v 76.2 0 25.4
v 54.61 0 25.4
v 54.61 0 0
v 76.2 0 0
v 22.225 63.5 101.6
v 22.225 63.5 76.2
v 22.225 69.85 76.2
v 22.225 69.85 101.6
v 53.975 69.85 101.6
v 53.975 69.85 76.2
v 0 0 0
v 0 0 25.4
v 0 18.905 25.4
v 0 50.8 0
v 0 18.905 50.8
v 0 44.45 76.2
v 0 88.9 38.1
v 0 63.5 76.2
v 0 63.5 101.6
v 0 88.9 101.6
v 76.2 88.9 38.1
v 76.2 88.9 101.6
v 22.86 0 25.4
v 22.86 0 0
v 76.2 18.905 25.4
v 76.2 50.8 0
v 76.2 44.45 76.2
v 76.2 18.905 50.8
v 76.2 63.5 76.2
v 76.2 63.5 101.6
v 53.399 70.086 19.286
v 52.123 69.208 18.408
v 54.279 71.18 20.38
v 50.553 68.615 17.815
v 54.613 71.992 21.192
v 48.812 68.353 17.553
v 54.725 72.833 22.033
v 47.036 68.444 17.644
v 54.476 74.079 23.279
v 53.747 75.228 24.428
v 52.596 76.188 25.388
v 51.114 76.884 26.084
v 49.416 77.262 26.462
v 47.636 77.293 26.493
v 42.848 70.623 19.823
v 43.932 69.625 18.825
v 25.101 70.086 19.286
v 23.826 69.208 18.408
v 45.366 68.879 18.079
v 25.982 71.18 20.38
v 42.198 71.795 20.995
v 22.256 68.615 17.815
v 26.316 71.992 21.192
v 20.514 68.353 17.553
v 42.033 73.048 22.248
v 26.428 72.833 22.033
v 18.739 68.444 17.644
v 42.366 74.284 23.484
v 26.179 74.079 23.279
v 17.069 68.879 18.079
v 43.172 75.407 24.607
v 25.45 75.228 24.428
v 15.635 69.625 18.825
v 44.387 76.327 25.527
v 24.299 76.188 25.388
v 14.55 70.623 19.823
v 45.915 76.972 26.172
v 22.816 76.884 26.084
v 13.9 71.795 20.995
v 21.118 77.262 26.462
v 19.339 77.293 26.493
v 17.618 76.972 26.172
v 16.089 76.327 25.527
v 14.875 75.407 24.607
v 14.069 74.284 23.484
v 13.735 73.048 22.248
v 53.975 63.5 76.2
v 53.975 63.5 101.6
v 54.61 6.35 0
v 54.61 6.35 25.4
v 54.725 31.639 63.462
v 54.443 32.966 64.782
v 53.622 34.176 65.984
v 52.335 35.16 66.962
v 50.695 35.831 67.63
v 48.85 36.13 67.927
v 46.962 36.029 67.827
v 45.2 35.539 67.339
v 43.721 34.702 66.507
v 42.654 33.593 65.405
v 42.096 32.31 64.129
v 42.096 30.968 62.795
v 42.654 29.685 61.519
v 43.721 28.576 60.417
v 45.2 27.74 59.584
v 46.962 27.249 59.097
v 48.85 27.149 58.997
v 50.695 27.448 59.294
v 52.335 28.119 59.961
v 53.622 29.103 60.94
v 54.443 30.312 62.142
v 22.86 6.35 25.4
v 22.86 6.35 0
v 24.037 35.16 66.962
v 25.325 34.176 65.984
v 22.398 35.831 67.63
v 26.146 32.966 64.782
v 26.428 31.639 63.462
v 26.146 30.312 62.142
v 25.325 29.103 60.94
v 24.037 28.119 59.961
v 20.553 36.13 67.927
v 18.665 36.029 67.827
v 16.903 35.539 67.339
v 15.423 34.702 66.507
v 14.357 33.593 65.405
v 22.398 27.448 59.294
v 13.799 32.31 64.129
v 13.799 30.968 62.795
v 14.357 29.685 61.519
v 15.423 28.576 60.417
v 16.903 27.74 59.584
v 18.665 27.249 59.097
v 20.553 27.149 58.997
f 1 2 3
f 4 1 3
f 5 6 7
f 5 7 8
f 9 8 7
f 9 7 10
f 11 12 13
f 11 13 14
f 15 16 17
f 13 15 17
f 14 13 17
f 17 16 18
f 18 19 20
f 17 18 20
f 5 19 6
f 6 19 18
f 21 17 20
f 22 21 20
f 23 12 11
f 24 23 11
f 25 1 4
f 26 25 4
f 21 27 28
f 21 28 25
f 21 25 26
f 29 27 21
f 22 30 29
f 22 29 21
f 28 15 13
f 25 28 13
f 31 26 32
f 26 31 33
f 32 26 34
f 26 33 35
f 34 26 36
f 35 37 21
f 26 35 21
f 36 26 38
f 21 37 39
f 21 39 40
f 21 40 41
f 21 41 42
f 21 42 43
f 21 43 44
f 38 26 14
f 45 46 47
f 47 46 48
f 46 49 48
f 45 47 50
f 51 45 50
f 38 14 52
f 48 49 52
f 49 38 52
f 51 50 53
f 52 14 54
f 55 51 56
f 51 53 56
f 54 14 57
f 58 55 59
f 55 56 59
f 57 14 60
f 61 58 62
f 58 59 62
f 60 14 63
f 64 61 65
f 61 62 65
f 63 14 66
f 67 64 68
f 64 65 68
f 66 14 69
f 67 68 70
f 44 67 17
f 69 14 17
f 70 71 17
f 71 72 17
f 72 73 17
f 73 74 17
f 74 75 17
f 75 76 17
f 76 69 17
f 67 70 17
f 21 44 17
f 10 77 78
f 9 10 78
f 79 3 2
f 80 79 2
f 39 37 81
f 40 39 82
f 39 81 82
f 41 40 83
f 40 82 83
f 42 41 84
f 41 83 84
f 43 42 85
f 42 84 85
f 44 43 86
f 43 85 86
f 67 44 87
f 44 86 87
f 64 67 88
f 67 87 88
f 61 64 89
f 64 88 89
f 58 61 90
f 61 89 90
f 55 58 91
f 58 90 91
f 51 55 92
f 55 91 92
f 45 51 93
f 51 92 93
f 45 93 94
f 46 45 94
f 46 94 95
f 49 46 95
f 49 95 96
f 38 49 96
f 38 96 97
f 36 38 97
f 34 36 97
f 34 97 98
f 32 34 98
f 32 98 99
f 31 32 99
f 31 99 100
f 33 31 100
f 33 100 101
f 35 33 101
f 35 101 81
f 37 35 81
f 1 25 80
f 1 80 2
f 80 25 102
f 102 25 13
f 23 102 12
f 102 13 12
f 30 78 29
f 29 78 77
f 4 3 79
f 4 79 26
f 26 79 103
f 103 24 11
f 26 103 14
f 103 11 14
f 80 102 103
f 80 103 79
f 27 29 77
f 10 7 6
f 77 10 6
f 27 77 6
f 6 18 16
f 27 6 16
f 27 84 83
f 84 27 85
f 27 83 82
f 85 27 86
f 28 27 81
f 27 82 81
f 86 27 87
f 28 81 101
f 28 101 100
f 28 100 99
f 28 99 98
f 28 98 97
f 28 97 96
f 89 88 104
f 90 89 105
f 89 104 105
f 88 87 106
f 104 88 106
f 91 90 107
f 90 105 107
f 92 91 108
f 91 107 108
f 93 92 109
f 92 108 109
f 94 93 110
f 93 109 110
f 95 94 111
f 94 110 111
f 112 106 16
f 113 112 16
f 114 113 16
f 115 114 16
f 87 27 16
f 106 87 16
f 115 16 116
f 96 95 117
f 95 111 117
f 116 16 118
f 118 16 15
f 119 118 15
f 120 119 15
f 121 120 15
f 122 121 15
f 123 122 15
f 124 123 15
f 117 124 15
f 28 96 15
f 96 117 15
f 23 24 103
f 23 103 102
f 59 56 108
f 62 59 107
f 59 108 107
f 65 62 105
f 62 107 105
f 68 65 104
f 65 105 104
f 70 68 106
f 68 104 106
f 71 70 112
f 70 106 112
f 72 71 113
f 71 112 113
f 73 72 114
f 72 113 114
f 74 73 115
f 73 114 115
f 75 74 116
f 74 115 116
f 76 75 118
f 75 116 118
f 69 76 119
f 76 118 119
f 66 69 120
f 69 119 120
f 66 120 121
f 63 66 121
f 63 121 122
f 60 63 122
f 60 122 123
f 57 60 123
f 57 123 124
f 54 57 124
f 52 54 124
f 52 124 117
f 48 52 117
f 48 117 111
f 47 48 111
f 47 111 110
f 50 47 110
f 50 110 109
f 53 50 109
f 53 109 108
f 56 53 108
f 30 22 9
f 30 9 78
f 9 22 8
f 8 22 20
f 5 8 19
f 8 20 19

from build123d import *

# Parameters (mm, degrees)
F1_DEPTH = 76.2
F2_W     = 31.75
F2_H     = 25.4
F3_DEPTH = 6.35
F4_W     = 31.75
F4_H     = 25.4
F5_DEPTH = 6.35
F6_R     = 6.35
F7_DEPTH = 80.518


with BuildPart() as f1:
    # F0 (on Right) → F1 (new body)
    with BuildSketch(Plane.YZ):
        Polygon((0, 25.4), (0, 0), (50.8, 0), (88.9, 38.1), (88.9, 101.6), (63.5, 101.6), (63.5, 76.2), (44.45, 76.2), (18.9050504968, 50.8), (18.9050504968, 25.4), align=None)
    extrude(amount=F1_DEPTH)

    # F2 (on face) → F3 (cut)
    with BuildSketch(Plane.XZ.offset(-63.5)):
        with Locations((38.1, 88.9)):
            Rectangle(F2_W, F2_H)
    extrude(amount=-F3_DEPTH, mode=Mode.SUBTRACT)

    # F4 (on face) → F5 (cut)
    with BuildSketch(Plane.XZ):
        with Locations((38.735, 12.7)):
            Rectangle(F4_W, F4_H)
    extrude(amount=-F5_DEPTH, mode=Mode.SUBTRACT)

    # F6 (on face) → F7 (cut)
    with BuildSketch(Plane(origin=(0, -16.0008520758, 16.092163712), x_dir=(1, 0, 0), z_dir=(0, -0.7050920541, 0.7091157841))):
        with Locations((20.0781384668, 67.1823460538)):
            Circle(F6_R)
        with Locations((48.3754940052, 67.1823460538)):
            Circle(F6_R)
    extrude(amount=-F7_DEPTH, mode=Mode.SUBTRACT)


solid = f1.part
